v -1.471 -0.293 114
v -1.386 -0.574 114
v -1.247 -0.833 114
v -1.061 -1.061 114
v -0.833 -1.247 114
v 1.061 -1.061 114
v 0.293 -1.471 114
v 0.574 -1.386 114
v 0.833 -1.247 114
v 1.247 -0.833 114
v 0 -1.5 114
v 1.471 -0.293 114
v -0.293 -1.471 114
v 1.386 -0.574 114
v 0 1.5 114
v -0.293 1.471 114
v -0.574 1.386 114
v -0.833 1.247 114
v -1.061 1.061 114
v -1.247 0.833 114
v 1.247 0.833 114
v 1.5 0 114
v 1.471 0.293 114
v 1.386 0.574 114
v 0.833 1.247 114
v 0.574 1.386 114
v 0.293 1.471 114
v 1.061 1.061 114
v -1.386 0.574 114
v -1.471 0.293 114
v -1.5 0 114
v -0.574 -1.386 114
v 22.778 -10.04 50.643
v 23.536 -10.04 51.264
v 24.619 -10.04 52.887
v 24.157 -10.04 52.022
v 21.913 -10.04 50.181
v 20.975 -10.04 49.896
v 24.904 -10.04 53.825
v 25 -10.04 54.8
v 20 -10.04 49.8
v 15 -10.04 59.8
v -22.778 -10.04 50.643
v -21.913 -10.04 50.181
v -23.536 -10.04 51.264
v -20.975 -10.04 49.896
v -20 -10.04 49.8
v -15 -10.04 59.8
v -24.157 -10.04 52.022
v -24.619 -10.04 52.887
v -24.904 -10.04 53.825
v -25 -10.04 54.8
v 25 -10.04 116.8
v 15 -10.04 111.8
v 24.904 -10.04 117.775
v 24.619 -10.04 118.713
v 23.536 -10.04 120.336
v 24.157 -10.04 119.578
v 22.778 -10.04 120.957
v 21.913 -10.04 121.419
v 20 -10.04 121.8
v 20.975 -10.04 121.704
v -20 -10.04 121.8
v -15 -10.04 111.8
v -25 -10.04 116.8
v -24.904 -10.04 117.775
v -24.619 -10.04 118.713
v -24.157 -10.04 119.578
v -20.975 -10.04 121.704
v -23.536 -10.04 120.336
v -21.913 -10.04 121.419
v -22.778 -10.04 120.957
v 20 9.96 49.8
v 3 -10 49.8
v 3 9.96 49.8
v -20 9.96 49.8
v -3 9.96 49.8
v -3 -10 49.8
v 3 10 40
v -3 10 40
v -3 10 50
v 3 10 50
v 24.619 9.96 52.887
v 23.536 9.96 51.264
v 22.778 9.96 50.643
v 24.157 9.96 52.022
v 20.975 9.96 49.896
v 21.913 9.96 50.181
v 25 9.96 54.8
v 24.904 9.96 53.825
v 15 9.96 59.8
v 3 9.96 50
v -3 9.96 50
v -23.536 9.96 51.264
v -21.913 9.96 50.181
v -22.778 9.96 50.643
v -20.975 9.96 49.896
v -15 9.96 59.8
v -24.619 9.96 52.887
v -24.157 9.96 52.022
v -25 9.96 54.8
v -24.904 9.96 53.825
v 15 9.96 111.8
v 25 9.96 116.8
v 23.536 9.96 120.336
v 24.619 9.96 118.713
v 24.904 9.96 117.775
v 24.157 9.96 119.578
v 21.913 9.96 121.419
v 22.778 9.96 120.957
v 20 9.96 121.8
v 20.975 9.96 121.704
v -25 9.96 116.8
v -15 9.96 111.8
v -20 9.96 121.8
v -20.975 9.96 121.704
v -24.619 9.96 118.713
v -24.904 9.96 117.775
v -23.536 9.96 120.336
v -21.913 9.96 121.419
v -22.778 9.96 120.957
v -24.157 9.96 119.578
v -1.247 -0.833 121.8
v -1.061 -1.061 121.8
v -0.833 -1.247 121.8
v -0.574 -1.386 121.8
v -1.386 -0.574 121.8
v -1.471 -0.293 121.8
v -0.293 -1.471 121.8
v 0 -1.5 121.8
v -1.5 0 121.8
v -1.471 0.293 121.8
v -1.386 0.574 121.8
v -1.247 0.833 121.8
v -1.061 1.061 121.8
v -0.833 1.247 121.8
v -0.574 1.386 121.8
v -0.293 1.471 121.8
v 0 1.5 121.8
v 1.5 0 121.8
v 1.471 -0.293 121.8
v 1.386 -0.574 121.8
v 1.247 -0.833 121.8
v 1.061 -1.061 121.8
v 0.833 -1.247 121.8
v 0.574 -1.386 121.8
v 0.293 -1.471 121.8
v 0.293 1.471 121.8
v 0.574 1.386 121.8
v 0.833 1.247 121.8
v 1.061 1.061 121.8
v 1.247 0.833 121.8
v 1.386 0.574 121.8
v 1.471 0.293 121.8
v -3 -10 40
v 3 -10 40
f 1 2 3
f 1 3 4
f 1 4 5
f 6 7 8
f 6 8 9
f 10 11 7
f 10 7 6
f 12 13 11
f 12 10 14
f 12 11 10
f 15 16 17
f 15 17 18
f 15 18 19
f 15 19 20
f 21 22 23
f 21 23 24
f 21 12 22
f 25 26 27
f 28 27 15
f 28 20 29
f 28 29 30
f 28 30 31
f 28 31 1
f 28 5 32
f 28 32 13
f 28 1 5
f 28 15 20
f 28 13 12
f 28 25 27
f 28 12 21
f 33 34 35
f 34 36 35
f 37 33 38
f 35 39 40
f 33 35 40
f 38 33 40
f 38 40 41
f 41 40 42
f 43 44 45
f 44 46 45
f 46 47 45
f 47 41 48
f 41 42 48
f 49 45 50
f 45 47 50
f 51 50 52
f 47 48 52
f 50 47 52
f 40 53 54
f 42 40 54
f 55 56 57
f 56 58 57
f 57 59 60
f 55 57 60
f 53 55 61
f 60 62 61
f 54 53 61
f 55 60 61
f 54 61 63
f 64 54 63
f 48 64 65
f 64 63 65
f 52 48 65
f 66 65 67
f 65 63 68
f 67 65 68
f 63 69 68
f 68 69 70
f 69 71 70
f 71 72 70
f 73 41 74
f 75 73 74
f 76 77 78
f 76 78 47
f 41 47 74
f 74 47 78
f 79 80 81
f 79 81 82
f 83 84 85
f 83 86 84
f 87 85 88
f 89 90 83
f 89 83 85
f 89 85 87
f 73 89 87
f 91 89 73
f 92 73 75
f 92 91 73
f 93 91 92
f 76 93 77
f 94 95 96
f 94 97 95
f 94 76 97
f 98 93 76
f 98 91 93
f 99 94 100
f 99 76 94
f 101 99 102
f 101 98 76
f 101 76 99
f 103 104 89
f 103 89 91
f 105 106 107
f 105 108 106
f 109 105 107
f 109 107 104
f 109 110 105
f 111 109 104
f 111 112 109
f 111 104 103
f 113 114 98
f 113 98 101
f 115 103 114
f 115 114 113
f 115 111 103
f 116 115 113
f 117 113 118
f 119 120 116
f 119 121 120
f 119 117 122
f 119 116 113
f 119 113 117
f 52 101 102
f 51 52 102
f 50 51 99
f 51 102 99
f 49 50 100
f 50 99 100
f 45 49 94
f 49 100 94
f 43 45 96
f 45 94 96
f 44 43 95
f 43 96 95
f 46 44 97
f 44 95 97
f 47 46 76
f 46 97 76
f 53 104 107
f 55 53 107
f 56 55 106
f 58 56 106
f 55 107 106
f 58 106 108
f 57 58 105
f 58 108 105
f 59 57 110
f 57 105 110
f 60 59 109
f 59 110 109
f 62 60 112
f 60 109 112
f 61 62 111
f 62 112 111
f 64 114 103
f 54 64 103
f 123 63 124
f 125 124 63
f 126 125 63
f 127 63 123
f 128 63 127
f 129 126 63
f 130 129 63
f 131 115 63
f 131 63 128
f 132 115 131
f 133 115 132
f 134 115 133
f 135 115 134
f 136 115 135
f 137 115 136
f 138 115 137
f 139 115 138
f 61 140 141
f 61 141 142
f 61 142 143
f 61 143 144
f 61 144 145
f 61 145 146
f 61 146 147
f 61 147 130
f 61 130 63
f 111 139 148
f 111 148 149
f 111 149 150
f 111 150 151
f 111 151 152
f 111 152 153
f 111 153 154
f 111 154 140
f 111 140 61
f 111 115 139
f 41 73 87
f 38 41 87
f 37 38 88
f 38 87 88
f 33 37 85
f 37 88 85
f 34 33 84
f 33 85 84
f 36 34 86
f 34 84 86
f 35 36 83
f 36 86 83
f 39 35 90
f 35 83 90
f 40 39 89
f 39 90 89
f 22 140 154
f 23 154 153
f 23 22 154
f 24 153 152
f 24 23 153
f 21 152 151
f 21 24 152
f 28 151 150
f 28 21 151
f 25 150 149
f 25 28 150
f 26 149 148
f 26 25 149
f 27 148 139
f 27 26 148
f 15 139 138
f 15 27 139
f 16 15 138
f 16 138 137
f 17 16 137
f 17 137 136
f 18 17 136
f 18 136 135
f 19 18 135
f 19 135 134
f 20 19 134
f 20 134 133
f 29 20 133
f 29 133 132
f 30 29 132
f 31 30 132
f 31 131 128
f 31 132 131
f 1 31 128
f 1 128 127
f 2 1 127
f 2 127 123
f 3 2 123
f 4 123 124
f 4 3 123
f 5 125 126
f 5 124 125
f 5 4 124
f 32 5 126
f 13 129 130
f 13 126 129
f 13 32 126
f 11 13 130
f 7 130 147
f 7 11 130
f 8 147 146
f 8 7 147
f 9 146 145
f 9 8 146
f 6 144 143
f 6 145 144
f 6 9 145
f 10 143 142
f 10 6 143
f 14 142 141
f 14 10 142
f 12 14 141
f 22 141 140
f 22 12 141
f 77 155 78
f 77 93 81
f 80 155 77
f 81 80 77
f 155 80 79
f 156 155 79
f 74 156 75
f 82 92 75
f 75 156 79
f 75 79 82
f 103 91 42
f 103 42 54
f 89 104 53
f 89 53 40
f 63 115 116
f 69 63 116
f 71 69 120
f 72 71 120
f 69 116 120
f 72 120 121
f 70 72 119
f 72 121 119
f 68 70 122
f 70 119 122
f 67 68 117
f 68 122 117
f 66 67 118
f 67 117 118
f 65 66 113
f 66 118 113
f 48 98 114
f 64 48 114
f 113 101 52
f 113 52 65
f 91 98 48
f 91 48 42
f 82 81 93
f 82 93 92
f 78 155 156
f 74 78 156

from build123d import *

# Parameters (mm, degrees)
CYLINDER001_R         = 1.5
CYLINDER001_DEPTH     = 10
SKETCH002_W           = 15
SKETCH002_H           = 26
PAD_DEPTH             = 10
CLONE_SCALE_SCALE     = 2
CLONE_PLACEMENT_ANGLE = 90
BOX_W                 = 6
BOX_H                 = 20
BOX_DEPTH             = 10


with BuildPart() as cilinder001:
    # Cylinder001 → Cylinder001 (new body)
    with BuildSketch(Plane.XY.offset(114)):
        Circle(CYLINDER001_R)
    extrude(amount=CYLINDER001_DEPTH)


with BuildPart() as nul:
    # Sketch002 → Pad (new body)
    with BuildSketch(Plane.XY.offset(11.4)):
        with BuildLine():
            Line((-10, -18), (10, -18))
            ThreePointArc((12.5, -20.5), (11.767767, -18.732233), (10, -18))
            Line((12.5, -20.5), (12.5, -51.5))
            ThreePointArc((10, -54), (11.767767, -53.267767), (12.5, -51.5))
            Line((10, -54), (-10, -54))
            ThreePointArc((-12.5, -51.5), (-11.767767, -53.267767), (-10, -54))
            Line((-12.5, -51.5), (-12.5, -20.5))
            ThreePointArc((-10, -18), (-11.767767, -18.732233), (-12.5, -20.5))
        make_face()
        with Locations((0, -36)):
            Rectangle(SKETCH002_W, SKETCH002_H, mode=Mode.SUBTRACT)
    extrude(amount=PAD_DEPTH)


with BuildPart() as nul_1:
    # Clone scale: moved
    add(nul.part.scale(CLONE_SCALE_SCALE))


with BuildPart() as nul_2:
    # Clone placement: moved
    add(nul_1.part.moved(Location((0, 32.76, 157.8))).rotate(Axis((0, 32.76, 157.8), (1, 0, 0)), CLONE_PLACEMENT_ANGLE))


with BuildPart() as de_nul:
    # Box → Box (new body)
    with BuildSketch(Plane(origin=(-3, -10, 40), x_dir=(1, 0, 0), z_dir=(0, 0, 1))):
        with Locations((3, 10)):
            Rectangle(BOX_W, BOX_H)
    extrude(amount=BOX_DEPTH)

    # Fusion001: union Nul
    add(nul_2.part)

    # Cut001: cut Cilinder001
    add(cilinder001.part, mode=Mode.SUBTRACT)


solid = de_nul.part
